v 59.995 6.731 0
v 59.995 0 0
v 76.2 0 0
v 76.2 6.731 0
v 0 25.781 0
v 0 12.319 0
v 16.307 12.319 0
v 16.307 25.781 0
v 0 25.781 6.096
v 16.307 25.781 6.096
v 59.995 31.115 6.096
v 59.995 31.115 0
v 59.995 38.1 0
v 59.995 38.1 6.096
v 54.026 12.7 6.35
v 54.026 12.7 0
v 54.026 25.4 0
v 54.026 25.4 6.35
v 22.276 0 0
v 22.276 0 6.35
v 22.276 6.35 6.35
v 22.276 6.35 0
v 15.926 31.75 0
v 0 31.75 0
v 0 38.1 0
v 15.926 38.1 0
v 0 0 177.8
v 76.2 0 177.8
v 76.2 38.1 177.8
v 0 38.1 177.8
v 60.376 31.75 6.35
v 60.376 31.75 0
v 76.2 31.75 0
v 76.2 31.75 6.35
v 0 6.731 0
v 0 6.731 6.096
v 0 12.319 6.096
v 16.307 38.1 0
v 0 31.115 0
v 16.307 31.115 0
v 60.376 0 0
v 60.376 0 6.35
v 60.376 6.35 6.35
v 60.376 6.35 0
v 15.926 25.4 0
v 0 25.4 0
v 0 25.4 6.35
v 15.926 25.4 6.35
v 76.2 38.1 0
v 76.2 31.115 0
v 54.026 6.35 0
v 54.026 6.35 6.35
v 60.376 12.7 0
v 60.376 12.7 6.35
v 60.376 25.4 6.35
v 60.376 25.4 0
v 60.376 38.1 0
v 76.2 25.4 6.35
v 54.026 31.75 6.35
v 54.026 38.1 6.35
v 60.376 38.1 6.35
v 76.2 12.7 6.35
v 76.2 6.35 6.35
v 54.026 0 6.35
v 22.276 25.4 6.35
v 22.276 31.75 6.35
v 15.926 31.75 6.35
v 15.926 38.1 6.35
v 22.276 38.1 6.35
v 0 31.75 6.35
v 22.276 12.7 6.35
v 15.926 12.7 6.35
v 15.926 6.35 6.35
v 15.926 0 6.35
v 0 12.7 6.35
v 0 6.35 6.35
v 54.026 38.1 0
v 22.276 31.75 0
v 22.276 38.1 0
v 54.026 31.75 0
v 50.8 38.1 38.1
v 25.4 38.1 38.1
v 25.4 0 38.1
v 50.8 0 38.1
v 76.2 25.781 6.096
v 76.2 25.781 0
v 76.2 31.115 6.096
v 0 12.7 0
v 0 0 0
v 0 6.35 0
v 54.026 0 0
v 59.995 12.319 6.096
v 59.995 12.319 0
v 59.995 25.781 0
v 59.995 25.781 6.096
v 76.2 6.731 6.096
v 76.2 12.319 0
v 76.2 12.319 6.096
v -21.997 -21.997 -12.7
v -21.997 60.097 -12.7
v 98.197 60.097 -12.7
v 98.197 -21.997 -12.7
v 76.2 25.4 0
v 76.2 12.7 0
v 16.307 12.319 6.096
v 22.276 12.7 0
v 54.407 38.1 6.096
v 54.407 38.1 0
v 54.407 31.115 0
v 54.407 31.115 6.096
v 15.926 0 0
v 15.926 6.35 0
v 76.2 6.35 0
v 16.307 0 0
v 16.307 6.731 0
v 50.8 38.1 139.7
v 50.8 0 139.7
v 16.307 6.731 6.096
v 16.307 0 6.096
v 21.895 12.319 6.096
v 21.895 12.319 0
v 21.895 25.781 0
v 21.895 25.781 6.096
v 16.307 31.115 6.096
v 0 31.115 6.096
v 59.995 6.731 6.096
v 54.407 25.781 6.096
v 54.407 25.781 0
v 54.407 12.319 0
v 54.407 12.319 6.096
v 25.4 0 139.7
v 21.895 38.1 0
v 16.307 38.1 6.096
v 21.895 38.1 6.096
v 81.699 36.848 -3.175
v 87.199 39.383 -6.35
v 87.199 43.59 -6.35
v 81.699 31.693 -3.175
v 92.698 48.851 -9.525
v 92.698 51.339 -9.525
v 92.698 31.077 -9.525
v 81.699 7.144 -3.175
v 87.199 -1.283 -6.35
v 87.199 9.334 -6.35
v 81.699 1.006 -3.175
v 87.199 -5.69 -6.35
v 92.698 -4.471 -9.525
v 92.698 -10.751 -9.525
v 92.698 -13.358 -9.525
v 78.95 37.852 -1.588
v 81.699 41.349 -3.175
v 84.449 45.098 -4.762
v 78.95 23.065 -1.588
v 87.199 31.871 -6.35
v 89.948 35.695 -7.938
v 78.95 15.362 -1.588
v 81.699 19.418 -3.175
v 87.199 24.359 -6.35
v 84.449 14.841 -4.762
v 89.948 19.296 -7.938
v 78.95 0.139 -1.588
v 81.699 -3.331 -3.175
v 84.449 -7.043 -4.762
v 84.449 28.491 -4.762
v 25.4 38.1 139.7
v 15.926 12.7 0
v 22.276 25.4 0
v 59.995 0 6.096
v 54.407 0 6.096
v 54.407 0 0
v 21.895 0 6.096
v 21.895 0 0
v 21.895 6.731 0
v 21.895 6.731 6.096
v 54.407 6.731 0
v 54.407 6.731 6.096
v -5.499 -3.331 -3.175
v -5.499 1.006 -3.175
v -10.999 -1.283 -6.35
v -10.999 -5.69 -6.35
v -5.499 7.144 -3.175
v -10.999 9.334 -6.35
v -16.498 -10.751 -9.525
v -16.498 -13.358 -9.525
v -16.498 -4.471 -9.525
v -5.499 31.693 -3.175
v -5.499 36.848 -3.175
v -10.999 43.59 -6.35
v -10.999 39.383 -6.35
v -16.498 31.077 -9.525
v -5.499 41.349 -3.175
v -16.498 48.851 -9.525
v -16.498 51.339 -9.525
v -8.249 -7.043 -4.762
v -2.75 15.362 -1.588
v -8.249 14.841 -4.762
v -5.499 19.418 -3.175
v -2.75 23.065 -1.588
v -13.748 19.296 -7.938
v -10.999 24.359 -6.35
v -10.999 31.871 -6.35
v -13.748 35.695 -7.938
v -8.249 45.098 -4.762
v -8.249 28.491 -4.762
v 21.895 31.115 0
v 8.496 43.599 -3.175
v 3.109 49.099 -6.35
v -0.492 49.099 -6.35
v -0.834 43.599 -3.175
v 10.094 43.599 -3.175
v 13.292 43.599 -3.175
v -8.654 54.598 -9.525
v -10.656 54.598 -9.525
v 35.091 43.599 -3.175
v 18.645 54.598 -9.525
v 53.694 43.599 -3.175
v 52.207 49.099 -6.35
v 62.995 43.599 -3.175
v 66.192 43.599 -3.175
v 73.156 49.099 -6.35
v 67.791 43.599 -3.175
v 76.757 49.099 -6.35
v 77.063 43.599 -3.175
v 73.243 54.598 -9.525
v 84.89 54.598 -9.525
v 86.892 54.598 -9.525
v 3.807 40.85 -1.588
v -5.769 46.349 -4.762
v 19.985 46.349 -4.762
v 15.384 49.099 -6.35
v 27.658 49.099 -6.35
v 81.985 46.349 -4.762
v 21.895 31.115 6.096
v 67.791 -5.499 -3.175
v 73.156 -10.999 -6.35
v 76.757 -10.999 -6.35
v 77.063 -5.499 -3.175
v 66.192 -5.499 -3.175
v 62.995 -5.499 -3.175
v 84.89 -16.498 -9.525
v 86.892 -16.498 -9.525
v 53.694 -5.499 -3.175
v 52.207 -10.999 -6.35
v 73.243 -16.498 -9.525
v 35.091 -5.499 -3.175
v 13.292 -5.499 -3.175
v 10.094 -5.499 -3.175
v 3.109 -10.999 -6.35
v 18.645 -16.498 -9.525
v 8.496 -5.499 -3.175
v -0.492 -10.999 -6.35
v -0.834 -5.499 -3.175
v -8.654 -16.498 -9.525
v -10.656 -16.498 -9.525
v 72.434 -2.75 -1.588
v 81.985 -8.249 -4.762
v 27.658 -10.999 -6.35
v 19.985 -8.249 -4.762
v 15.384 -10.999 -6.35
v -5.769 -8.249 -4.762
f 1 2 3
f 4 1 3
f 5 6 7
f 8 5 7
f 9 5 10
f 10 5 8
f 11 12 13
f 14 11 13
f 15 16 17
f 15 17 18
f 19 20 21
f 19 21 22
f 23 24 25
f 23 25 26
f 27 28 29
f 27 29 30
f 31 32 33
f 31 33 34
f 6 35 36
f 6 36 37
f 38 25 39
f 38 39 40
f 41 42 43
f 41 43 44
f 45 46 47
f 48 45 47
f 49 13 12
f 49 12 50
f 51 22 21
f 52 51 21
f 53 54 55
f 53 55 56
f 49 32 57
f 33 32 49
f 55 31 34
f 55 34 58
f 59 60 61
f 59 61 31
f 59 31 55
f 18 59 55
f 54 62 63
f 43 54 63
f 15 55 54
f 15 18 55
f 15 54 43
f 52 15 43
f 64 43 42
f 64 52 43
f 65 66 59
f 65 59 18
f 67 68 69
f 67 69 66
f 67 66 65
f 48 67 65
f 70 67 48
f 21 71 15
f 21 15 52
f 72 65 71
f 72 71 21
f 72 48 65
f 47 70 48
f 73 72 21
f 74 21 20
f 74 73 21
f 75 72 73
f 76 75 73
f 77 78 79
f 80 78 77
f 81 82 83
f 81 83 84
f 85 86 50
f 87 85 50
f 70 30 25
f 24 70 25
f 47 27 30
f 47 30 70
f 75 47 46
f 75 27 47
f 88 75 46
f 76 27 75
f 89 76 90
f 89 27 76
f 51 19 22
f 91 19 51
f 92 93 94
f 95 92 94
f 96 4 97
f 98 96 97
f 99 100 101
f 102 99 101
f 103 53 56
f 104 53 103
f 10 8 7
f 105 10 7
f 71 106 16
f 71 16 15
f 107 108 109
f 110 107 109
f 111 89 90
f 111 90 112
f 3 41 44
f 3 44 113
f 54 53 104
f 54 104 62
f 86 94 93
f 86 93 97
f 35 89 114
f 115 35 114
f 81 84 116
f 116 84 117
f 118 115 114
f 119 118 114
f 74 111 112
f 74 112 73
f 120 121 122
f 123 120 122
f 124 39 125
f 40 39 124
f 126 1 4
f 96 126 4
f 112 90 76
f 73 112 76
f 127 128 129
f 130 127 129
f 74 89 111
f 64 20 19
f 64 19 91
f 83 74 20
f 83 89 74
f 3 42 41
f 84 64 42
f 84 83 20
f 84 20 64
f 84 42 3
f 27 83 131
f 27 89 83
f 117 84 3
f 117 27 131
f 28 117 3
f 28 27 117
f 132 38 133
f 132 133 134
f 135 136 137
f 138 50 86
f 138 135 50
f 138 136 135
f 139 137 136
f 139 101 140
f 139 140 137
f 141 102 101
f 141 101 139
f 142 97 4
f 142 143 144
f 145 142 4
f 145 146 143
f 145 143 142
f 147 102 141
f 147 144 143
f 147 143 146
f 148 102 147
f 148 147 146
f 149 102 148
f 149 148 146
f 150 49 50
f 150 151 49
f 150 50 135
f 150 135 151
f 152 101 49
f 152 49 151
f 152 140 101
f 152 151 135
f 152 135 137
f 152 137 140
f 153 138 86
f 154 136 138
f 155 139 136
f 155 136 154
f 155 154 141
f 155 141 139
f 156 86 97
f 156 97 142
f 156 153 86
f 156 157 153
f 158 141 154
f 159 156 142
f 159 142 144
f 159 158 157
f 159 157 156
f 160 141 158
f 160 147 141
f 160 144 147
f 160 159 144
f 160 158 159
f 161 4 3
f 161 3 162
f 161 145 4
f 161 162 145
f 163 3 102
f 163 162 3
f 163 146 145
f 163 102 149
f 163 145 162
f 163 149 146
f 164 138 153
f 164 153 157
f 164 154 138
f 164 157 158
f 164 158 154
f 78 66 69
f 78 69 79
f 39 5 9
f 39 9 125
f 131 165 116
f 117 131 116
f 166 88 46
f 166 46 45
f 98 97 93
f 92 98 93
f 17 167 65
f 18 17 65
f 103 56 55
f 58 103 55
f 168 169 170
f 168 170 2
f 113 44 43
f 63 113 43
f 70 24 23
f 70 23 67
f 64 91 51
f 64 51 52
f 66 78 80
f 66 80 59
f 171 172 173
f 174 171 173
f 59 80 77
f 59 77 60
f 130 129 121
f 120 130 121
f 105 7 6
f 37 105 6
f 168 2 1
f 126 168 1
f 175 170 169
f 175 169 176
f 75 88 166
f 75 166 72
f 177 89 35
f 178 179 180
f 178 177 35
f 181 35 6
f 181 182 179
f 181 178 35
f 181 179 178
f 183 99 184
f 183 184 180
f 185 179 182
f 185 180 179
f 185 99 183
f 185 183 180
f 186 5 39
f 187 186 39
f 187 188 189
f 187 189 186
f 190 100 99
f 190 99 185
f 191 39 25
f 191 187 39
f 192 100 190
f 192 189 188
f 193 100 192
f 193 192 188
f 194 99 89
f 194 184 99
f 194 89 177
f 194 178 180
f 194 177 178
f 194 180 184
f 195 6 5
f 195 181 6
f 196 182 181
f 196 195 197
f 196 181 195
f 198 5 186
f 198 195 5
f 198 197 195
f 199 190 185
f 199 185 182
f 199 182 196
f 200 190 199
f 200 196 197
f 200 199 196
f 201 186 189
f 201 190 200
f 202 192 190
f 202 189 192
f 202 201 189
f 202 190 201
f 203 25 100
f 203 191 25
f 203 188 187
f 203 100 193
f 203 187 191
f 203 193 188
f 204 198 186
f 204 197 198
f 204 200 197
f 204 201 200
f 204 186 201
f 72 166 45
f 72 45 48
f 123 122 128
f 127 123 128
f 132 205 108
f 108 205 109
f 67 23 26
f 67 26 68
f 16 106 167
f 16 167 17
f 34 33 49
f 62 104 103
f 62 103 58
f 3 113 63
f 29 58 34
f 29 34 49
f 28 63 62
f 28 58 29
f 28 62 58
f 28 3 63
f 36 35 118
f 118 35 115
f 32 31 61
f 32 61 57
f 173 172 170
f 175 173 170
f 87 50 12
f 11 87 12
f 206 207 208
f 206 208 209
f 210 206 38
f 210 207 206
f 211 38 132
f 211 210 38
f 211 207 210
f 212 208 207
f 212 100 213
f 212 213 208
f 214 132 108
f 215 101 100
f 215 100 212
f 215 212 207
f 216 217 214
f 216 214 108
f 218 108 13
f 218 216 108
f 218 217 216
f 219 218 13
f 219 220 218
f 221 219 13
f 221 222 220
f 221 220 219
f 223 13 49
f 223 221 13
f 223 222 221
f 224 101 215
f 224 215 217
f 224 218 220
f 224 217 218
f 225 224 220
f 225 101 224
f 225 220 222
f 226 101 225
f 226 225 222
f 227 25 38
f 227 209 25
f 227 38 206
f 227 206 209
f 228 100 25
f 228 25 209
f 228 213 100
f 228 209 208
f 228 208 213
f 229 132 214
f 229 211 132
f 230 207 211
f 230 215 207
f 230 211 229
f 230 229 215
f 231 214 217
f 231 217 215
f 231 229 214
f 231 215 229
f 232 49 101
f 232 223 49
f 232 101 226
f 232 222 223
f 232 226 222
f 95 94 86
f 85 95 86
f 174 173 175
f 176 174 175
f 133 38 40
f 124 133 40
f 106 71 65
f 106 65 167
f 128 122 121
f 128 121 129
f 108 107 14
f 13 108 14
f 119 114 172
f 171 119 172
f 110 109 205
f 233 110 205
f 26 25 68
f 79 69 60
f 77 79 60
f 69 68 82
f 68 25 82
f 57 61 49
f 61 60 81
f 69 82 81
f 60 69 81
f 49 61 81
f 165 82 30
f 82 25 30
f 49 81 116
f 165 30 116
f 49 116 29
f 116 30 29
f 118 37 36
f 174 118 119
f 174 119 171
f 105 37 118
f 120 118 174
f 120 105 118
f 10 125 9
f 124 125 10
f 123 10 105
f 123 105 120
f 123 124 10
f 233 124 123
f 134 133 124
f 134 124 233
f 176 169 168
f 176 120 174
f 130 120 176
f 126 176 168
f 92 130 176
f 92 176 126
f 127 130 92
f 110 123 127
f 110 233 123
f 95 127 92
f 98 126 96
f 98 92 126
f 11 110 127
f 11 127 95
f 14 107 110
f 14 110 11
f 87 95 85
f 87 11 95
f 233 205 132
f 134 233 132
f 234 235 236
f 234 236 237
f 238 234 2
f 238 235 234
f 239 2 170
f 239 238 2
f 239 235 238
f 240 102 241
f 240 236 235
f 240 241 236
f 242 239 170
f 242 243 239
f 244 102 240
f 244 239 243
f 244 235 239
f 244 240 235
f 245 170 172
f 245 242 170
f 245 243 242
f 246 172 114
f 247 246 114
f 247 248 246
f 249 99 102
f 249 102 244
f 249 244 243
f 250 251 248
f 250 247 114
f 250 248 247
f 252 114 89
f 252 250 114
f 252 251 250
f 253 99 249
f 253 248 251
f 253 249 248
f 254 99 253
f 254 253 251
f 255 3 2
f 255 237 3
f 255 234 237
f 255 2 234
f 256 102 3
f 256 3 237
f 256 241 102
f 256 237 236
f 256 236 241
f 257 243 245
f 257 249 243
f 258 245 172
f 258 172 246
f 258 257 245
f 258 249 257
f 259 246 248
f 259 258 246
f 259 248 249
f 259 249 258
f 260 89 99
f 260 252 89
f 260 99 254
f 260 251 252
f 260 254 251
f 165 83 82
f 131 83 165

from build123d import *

# Parameters (mm, degrees)
F0_W     = 25.4
F0_H     = 101.6
F1_DEPTH = 38.1
F2_W     = 6.35
F2_H     = 6.35
F3_DEPTH = 76.201
F4_W     = 5.588
F4_H     = 6.731
F4_H_2   = 5.588
F4_W_2   = 16.3065173057
F4_H_3   = 13.462
F4_W_3   = 32.512
F4_W_4   = 16.2054826943
F4_H_4   = 5.334
F4_H_5   = 6.985
F5_DEPTH = 6.096
F6_W     = 76.2
F6_H     = 38.1
F7_DEPTH = 12.7
F7_TAPER = -60


with BuildPart() as f1:
    # F0 (on Front) → F1 (new body)
    with BuildSketch(Plane.XZ):
        Polygon((0, 177.8), (0, 0), (15.9255173057, 0), (15.9255173057, 6.35), (22.2755173057, 6.35), (22.2755173057, 0), (54.0255173057, 0), (54.0255173057, 6.35), (60.3755173057, 6.35), (60.3755173057, 0), (76.2, 0), (76.2, 177.8), align=None)
        with Locations((38.1, 88.9)):
            Rectangle(F0_W, F0_H, mode=Mode.SUBTRACT)
    extrude(amount=-F1_DEPTH)

    # F2 (on face) → F3 (cut, through all)
    with BuildSketch(Plane(origin=(0, 0, 0), x_dir=(0, -1, 0), z_dir=(-1, 0, 0))):
        with Locations((-28.575, 3.175)):
            Rectangle(F2_W, F2_H)
        with Locations((-9.525, 3.175)):
            Rectangle(F2_W, F2_H)
    extrude(amount=-F3_DEPTH, mode=Mode.SUBTRACT)


with BuildPart() as f5:
    # F4 (on Top) → F5 (new body)
    with BuildSketch(Plane.XY):
        with Locations((19.1005173057, 3.3655)):
            Rectangle(F4_W, F4_H)
        with Locations((19.1005173057, 9.525)):
            Rectangle(F4_W, F4_H_2)
        with Locations((8.1532586529, 9.525)):
            Rectangle(F4_W_2, F4_H_2)
        with Locations((19.1005173057, 19.05)):
            Rectangle(F4_W, F4_H_3)
        with Locations((38.1505173057, 9.525)):
            Rectangle(F4_W_3, F4_H_2)
        with Locations((57.2005173057, 9.525)):
            Rectangle(F4_W, F4_H_2)
        with Locations((57.2005173057, 3.3655)):
            Rectangle(F4_W, F4_H)
        with Locations((68.0972586529, 9.525)):
            Rectangle(F4_W_4, F4_H_2)
        with Locations((57.2005173057, 19.05)):
            Rectangle(F4_W, F4_H_3)
        with Locations((57.2005173057, 28.448)):
            Rectangle(F4_W, F4_H_4)
        with Locations((68.0972586529, 28.448)):
            Rectangle(F4_W_4, F4_H_4)
        with Locations((57.2005173057, 34.6075)):
            Rectangle(F4_W, F4_H_5)
        with Locations((38.1505173057, 28.448)):
            Rectangle(F4_W_3, F4_H_4)
        with Locations((19.1005173057, 28.448)):
            Rectangle(F4_W, F4_H_4)
        with Locations((19.1005173057, 34.6075)):
            Rectangle(F4_W, F4_H_5)
        with Locations((8.1532586529, 28.448)):
            Rectangle(F4_W_2, F4_H_4)
    extrude(amount=F5_DEPTH)

    # F6 (on face) → F7 (join)
    with BuildSketch(Plane(origin=(0, 0, 0), x_dir=(1, 0, 0), z_dir=(0, 0, -1))):
        with Locations((38.1, -19.05)):
            Rectangle(F6_W, F6_H)
    extrude(amount=F7_DEPTH, taper=F7_TAPER)


solid = Compound([f1.part, f5.part])
